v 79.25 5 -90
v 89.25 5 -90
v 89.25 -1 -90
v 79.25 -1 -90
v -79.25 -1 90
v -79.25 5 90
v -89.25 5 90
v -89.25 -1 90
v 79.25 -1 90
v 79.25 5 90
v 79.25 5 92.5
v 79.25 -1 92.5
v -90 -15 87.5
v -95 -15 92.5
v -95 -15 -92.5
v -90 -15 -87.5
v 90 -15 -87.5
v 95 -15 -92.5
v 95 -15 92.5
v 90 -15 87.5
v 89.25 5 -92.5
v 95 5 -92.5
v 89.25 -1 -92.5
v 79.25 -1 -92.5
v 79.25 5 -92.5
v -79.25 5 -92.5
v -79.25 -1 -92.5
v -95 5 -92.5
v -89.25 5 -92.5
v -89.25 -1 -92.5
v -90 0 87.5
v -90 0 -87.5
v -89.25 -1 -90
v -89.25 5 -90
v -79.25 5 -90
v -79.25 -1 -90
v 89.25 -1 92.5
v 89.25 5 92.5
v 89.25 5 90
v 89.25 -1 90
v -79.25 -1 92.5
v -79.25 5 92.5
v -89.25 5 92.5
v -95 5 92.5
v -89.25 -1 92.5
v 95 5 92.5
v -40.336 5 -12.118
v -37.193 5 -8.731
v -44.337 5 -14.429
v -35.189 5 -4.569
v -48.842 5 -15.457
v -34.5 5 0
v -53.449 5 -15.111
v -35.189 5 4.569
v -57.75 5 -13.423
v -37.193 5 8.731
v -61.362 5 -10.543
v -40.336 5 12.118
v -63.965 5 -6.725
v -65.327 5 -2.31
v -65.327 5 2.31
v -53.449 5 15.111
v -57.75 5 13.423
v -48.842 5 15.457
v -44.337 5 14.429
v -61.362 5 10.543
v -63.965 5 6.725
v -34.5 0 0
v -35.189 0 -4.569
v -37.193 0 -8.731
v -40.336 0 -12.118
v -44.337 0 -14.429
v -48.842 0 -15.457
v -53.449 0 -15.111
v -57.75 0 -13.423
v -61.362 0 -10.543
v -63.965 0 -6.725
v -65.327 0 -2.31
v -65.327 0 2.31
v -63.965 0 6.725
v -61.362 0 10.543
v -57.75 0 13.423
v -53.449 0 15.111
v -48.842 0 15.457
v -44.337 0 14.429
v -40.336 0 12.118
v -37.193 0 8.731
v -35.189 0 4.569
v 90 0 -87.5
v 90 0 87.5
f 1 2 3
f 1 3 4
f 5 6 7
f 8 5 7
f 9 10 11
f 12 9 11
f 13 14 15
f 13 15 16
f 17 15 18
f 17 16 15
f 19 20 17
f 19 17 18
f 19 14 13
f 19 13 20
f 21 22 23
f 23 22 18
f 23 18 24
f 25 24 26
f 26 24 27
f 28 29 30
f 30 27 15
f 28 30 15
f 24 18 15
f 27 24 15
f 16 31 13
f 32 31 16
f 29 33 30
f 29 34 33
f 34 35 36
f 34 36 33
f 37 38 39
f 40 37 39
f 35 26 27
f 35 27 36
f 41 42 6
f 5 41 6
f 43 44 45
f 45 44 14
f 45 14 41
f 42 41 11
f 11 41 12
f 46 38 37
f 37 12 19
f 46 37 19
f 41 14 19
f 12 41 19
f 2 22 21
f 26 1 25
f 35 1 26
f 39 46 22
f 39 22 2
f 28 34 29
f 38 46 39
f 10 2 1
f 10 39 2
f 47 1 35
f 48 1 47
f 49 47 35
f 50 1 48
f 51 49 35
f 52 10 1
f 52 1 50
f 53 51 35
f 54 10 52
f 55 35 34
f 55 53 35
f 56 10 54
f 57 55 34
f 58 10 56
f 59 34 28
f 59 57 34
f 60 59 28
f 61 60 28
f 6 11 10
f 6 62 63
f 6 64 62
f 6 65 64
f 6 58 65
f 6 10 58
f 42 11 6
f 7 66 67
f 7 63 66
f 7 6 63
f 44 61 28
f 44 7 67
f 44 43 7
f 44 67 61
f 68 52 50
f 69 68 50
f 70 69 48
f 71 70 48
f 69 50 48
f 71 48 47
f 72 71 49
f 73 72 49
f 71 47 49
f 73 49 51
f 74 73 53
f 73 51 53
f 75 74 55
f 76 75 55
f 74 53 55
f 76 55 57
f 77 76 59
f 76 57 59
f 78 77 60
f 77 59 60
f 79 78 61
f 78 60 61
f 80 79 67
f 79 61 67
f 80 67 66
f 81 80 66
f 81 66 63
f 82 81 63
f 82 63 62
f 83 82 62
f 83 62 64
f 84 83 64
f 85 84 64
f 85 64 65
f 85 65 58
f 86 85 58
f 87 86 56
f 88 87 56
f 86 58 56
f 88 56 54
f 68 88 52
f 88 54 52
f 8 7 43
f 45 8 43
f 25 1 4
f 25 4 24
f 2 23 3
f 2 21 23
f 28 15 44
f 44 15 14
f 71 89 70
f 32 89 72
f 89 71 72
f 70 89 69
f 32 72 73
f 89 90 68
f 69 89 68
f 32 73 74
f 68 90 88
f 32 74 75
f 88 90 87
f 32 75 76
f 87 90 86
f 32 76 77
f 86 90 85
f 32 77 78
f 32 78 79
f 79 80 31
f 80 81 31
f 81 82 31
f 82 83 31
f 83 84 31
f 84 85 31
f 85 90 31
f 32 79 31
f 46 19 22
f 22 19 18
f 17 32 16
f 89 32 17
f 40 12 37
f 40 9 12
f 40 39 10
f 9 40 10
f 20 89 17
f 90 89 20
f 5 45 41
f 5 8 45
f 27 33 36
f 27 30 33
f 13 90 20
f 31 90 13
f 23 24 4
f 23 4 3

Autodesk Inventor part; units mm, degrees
ref_plane "YZ Plane" through (0, 0, 0) normal (1, 0, 0) x (0, 1, 0)
ref_plane "XZ Plane" through (0, 0, 0) normal (0, 1, 0) x (-1, 0, 0)
ref_plane "XY Plane" through (0, 0, 0) normal (0, 0, 1) x (1, 0, 0)
sketch "Sketch1" plane through (0, 0, 0) normal (0, 1, 0) x (-1, 0, 0)
  line L0 (95, 92.5) -> (-95, 92.5)
  line L1 (-95, 92.5) -> (-95, -92.5)
  line L2 (-95, -92.5) -> (95, -92.5)
  line L3 (95, -92.5) -> (95, 92.5)
  point P0 (0, 0)
  dimension "d0" = 190
  dimension "d1" = 185
  dimension "d2" = 95
  dimension "d3" = 92.5
extrude "Extrusion1" add sketch "Sketch1" along normal blind 5
sketch "Sketch2" plane through (0, 0, 0) normal (0, -1, 0) x (1, 0, 0)
  line L0 (90, 87.5) -> (-90, 87.5)
  line L1 (-90, 87.5) -> (-90, -87.5)
  line L2 (-90, -87.5) -> (90, -87.5)
  line L3 (90, -87.5) -> (90, 87.5)
  line L4 (-95, 92.5) -> (95, 92.5) projected
  line L5 (-95, -92.5) -> (-95, 92.5) projected
  line L6 (95, -92.5) -> (-95, -92.5) projected
  line L7 (95, 92.5) -> (95, -92.5) projected
  line L8 (95, 92.5) -> (-95, 92.5)
  line L9 (-95, 92.5) -> (-95, -92.5)
  line L10 (-95, -92.5) -> (95, -92.5)
  line L11 (95, -92.5) -> (95, 92.5)
  point P0 (0, 0)
  dimension "d109" = 5
  dimension "d110" = 5
  dimension "d111" = 5
  dimension "d112" = 5
extrude "Extrusion2" add sketch "Sketch2" along normal blind 15
sketch "Sketch3" plane through (0, 5, 0) normal (0, 1, 0) x (1, 0, 0)
  circle A0 centre (-50, 0) radius 15.5
  point P0 (0, 0)
  dimension "d12" = 31
  dimension "d13" = 50
extrude "Extrusion3" cut sketch "Sketch3" against normal through all
sketch "Sketch4" plane through (0, 5, 0) normal (0, 1, 0) x (1, 0, 0)
  circle A0 centre (-50, 0) radius 15.5 projected
  line L0 (-95, -92.5) -> (95, -92.5) projected
  line L1 (95, -92.5) -> (95, 92.5) projected
  line L2 (95, 92.5) -> (-95, 92.5) projected
  line L3 (-95, 92.5) -> (-95, -92.5) projected
  circle A1 centre (-77.5, -75) radius 7.5
  circle A2 centre (-77.5, 75) radius 7.5
  circle A3 centre (77.5, -75) radius 7.5
  circle A4 centre (77.5, 75) radius 7.5
  circle A5 centre (-77.5, -75) radius 8.5
  circle A6 centre (-77.5, 75) radius 8.5
  circle A7 centre (77.5, 75) radius 8.5
  circle A8 centre (77.5, -75) radius 8.5
  point P0 (0, 0)
  dimension "d16" = 15
  dimension "d17" = 17.5
  dimension "d18" = 17.5
  dimension "d19" = 15
  dimension "d20" = 15
  dimension "d21" = 15
  dimension "d22" = 17.5
  dimension "d23" = 17.5
  dimension "d24" = 17.5
  dimension "d25" = 17.5
  dimension "d26" = 17.5
  dimension "d27" = 17.5
  dimension "d28" = 17
  dimension "d29" = 17
  dimension "d30" = 17
  dimension "d31" = 17
  dimension "d34" = 75
  dimension "d35" = 77.5
extrude "Extrusion4" [suppressed]
sketch "Sketch8" plane through (0, 5, 0) normal (0, 1, 0) x (1, 0, 0)
  circle A0 centre (-50, 0) radius 15.5 projected
  line L0 (-95, -92.5) -> (95, -92.5) projected
  line L1 (95, -92.5) -> (95, 92.5) projected
  line L2 (95, 92.5) -> (-95, 92.5) projected
  line L3 (-95, 92.5) -> (-95, -92.5) projected
  line L4 (-50, 13.5) -> (-50, -13.5)
  line L5 (-50, 13.5) -> (-95, 13.5)
  line L6 (-50, -13.5) -> (-95, -13.5)
  line L7 (-95, -13.5) -> (-95, 13.5)
  point P0 (0, 0)
  dimension "d51" = 27
  dimension "d52" = 13.5
  dimension "d62" = 31
extrude "Extrusion8" [suppressed]
sketch "Sketch10" plane through (-115, 5, -13.5) normal (0, 0, 1) x (1, 0, 0)
  line L0 (5, -20) -> (0, -20) projected
  line L1 (5, -5) -> (5, -20) projected
  line L2 (65, -5) -> (5, -5) projected
  line L3 (65, 0) -> (65, -5) projected
  line L4 (0, 0) -> (65, 0) projected
  line L5 (0, -20) -> (0, 0) projected
  line L6 (5, -17.5) -> (2.5, -17.5)
  line L7 (2.5, -17.5) -> (2.5, -2.5)
  line L8 (2.5, -2.5) -> (5, -2.5)
  line L9 (5, -2.5) -> (5, -17.5)
  line L10 (62.5, -5) -> (2.5, -5)
  line L11 (2.5, -5) -> (2.5, -2.5)
  line L12 (2.5, -2.5) -> (62.5, -2.5)
  line L13 (62.5, -2.5) -> (62.5, -5)
  point P0 (115, -5)
  dimension "d64" = 2.5
  dimension "d65" = 15
  dimension "d67" = 2.5
  dimension "d68" = 2.5
  dimension "d71" = 2.5
  dimension "d72" = 0
extrude "Extrusion10" [suppressed]
mirror "Mirror3" [suppressed]
sketch "Sketch12" plane through (0, 5, 0) normal (0, 1, 0) x (1, 0, 0)
  line L0 (-114.5, 13.5) -> (-109.5, 13.5)
  line L1 (-109.5, 13.5) -> (-109.5, 87.5)
  line L2 (-109.5, 87.5) -> (109.5, 87.5)
  line L3 (109.5, 87.5) -> (109.5, -87.5)
  line L4 (109.5, -87.5) -> (-109.5, -87.5)
  line L5 (-109.5, -87.5) -> (-109.5, -13.5)
  line L6 (-109.5, -13.5) -> (-114.5, -13.5)
  line L7 (-114.5, -13.5) -> (-114.5, -92.5)
  line L8 (-114.5, -92.5) -> (114.5, -92.5)
  line L9 (114.5, -92.5) -> (114.5, 92.5)
  line L10 (114.5, 92.5) -> (-114.5, 92.5)
  line L11 (-114.5, 92.5) -> (-114.5, 13.5)
  line L12 (-89.25, -92.5) -> (-79.25, -92.5)
  line L13 (-79.25, -92.5) -> (-79.25, -90)
  line L14 (-79.25, -90) -> (-89.25, -90)
  line L15 (-89.25, -90) -> (-89.25, -92.5)
  line L16 (79.25, -92.5) -> (89.25, -92.5)
  line L17 (89.25, -92.5) -> (89.25, -90)
  line L18 (89.25, -90) -> (79.25, -90)
  line L19 (79.25, -90) -> (79.25, -92.5)
  line L20 (-89.25, 92.5) -> (-79.25, 92.5)
  line L21 (-79.25, 92.5) -> (-79.25, 90)
  line L22 (-79.25, 90) -> (-89.25, 90)
  line L23 (-89.25, 90) -> (-89.25, 92.5)
  line L24 (79.25, 92.5) -> (89.25, 92.5)
  line L25 (89.25, 92.5) -> (89.25, 90)
  line L26 (89.25, 90) -> (79.25, 90)
  line L27 (79.25, 90) -> (79.25, 92.5)
  point P0 (0, 0)
  point P1 (0, 0)
  dimension "d87" = 10
  dimension "d88" = 2.5
  dimension "d89" = 20.25
  dimension "d90" = 10
  dimension "d91" = 2.5
  dimension "d92" = 20.25
  dimension "d93" = 2.5
  dimension "d94" = 10
  dimension "d95" = 20.25
  dimension "d96" = 2.5
  dimension "d97" = 10
  dimension "d98" = 20.25
  dimension "d113" = 5
  dimension "d114" = 5
  dimension "d115" = 5
  dimension "d116" = 5
  dimension "d117" = 5
  dimension "d118" = 229
  dimension "d119" = 229
  dimension "d120" = 158.5
  dimension "d121" = 79.25
  dimension "d122" = 79.25
extrude "Extrusion12" cut sketch "Sketch12" against normal blind 6 contours L10 L21 L22 L23 | L10 L25 L26 L27 | L8 L19 L18 L17 | L15 L14 L13 L8
sketch "Sketch13" plane through (0, -15, 0) normal (0, -1, 0) x (1, 0, 0)
  line L0 (-90, -87.5) -> (-90, 87.5) projected
  line L1 (-90, 87.5) -> (90, 87.5) projected
  line L2 (90, 87.5) -> (90, -87.5) projected
  line L3 (90, -87.5) -> (-90, -87.5) projected
  line L4 (-95, 92.5) -> (-95, -92.5) projected
  line L5 (-95, -92.5) -> (95, -92.5) projected
  line L6 (95, -92.5) -> (95, 92.5) projected
  line L7 (95, 92.5) -> (-95, 92.5) projected
  line L8 (112.75, -90.25) -> (-112.75, -90.25)
  line L9 (-112.75, -90.25) -> (-112.75, 90.25)
  line L10 (-112.75, 90.25) -> (112.75, 90.25)
  line L11 (112.75, 90.25) -> (112.75, -90.25)
  point P0 (0, 0)
  dimension "d101" = 185
  dimension "d102" = 180.5
  dimension "d104" = 225.5
  dimension "d105" = 112.75
  dimension "d106" = 90.25
extrude "Extrusion13" [suppressed]
equation "\"d2\" = 0.5 * d0"
equation "\"d3\" = 0.5 * d1"
equation "\"d110\" = d109"
equation "\"d111\" = d109"
equation "\"d112\" = d109"
equation "\"d18\" = d17"
equation "\"d19\" = d16"
equation "\"d20\" = d16"
equation "\"d21\" = d16"
equation "\"d22\" = d17"
equation "\"d23\" = d22"
equation "\"d24\" = d17"
equation "\"d25\" = d24"
equation "\"d26\" = d17"
equation "\"d27\" = d26"
equation "\"d29\" = d28"
equation "\"d30\" = d28"
equation "\"d31\" = d28"
equation "\"d52\" = 0.5 * d51"
equation "\"d90\" = d87"
equation "\"d91\" = d88"
equation "\"d92\" = d89"
equation "\"d93\" = d88"
equation "\"d94\" = d87"
equation "\"d95\" = d89"
equation "\"d96\" = d88"
equation "\"d97\" = d87"
equation "\"d98\" = d89"
equation "\"d105\" = 0.5 * d104"
equation "\"d106\" = 0.5 * d102"
properties part number "Bottom Roof"
